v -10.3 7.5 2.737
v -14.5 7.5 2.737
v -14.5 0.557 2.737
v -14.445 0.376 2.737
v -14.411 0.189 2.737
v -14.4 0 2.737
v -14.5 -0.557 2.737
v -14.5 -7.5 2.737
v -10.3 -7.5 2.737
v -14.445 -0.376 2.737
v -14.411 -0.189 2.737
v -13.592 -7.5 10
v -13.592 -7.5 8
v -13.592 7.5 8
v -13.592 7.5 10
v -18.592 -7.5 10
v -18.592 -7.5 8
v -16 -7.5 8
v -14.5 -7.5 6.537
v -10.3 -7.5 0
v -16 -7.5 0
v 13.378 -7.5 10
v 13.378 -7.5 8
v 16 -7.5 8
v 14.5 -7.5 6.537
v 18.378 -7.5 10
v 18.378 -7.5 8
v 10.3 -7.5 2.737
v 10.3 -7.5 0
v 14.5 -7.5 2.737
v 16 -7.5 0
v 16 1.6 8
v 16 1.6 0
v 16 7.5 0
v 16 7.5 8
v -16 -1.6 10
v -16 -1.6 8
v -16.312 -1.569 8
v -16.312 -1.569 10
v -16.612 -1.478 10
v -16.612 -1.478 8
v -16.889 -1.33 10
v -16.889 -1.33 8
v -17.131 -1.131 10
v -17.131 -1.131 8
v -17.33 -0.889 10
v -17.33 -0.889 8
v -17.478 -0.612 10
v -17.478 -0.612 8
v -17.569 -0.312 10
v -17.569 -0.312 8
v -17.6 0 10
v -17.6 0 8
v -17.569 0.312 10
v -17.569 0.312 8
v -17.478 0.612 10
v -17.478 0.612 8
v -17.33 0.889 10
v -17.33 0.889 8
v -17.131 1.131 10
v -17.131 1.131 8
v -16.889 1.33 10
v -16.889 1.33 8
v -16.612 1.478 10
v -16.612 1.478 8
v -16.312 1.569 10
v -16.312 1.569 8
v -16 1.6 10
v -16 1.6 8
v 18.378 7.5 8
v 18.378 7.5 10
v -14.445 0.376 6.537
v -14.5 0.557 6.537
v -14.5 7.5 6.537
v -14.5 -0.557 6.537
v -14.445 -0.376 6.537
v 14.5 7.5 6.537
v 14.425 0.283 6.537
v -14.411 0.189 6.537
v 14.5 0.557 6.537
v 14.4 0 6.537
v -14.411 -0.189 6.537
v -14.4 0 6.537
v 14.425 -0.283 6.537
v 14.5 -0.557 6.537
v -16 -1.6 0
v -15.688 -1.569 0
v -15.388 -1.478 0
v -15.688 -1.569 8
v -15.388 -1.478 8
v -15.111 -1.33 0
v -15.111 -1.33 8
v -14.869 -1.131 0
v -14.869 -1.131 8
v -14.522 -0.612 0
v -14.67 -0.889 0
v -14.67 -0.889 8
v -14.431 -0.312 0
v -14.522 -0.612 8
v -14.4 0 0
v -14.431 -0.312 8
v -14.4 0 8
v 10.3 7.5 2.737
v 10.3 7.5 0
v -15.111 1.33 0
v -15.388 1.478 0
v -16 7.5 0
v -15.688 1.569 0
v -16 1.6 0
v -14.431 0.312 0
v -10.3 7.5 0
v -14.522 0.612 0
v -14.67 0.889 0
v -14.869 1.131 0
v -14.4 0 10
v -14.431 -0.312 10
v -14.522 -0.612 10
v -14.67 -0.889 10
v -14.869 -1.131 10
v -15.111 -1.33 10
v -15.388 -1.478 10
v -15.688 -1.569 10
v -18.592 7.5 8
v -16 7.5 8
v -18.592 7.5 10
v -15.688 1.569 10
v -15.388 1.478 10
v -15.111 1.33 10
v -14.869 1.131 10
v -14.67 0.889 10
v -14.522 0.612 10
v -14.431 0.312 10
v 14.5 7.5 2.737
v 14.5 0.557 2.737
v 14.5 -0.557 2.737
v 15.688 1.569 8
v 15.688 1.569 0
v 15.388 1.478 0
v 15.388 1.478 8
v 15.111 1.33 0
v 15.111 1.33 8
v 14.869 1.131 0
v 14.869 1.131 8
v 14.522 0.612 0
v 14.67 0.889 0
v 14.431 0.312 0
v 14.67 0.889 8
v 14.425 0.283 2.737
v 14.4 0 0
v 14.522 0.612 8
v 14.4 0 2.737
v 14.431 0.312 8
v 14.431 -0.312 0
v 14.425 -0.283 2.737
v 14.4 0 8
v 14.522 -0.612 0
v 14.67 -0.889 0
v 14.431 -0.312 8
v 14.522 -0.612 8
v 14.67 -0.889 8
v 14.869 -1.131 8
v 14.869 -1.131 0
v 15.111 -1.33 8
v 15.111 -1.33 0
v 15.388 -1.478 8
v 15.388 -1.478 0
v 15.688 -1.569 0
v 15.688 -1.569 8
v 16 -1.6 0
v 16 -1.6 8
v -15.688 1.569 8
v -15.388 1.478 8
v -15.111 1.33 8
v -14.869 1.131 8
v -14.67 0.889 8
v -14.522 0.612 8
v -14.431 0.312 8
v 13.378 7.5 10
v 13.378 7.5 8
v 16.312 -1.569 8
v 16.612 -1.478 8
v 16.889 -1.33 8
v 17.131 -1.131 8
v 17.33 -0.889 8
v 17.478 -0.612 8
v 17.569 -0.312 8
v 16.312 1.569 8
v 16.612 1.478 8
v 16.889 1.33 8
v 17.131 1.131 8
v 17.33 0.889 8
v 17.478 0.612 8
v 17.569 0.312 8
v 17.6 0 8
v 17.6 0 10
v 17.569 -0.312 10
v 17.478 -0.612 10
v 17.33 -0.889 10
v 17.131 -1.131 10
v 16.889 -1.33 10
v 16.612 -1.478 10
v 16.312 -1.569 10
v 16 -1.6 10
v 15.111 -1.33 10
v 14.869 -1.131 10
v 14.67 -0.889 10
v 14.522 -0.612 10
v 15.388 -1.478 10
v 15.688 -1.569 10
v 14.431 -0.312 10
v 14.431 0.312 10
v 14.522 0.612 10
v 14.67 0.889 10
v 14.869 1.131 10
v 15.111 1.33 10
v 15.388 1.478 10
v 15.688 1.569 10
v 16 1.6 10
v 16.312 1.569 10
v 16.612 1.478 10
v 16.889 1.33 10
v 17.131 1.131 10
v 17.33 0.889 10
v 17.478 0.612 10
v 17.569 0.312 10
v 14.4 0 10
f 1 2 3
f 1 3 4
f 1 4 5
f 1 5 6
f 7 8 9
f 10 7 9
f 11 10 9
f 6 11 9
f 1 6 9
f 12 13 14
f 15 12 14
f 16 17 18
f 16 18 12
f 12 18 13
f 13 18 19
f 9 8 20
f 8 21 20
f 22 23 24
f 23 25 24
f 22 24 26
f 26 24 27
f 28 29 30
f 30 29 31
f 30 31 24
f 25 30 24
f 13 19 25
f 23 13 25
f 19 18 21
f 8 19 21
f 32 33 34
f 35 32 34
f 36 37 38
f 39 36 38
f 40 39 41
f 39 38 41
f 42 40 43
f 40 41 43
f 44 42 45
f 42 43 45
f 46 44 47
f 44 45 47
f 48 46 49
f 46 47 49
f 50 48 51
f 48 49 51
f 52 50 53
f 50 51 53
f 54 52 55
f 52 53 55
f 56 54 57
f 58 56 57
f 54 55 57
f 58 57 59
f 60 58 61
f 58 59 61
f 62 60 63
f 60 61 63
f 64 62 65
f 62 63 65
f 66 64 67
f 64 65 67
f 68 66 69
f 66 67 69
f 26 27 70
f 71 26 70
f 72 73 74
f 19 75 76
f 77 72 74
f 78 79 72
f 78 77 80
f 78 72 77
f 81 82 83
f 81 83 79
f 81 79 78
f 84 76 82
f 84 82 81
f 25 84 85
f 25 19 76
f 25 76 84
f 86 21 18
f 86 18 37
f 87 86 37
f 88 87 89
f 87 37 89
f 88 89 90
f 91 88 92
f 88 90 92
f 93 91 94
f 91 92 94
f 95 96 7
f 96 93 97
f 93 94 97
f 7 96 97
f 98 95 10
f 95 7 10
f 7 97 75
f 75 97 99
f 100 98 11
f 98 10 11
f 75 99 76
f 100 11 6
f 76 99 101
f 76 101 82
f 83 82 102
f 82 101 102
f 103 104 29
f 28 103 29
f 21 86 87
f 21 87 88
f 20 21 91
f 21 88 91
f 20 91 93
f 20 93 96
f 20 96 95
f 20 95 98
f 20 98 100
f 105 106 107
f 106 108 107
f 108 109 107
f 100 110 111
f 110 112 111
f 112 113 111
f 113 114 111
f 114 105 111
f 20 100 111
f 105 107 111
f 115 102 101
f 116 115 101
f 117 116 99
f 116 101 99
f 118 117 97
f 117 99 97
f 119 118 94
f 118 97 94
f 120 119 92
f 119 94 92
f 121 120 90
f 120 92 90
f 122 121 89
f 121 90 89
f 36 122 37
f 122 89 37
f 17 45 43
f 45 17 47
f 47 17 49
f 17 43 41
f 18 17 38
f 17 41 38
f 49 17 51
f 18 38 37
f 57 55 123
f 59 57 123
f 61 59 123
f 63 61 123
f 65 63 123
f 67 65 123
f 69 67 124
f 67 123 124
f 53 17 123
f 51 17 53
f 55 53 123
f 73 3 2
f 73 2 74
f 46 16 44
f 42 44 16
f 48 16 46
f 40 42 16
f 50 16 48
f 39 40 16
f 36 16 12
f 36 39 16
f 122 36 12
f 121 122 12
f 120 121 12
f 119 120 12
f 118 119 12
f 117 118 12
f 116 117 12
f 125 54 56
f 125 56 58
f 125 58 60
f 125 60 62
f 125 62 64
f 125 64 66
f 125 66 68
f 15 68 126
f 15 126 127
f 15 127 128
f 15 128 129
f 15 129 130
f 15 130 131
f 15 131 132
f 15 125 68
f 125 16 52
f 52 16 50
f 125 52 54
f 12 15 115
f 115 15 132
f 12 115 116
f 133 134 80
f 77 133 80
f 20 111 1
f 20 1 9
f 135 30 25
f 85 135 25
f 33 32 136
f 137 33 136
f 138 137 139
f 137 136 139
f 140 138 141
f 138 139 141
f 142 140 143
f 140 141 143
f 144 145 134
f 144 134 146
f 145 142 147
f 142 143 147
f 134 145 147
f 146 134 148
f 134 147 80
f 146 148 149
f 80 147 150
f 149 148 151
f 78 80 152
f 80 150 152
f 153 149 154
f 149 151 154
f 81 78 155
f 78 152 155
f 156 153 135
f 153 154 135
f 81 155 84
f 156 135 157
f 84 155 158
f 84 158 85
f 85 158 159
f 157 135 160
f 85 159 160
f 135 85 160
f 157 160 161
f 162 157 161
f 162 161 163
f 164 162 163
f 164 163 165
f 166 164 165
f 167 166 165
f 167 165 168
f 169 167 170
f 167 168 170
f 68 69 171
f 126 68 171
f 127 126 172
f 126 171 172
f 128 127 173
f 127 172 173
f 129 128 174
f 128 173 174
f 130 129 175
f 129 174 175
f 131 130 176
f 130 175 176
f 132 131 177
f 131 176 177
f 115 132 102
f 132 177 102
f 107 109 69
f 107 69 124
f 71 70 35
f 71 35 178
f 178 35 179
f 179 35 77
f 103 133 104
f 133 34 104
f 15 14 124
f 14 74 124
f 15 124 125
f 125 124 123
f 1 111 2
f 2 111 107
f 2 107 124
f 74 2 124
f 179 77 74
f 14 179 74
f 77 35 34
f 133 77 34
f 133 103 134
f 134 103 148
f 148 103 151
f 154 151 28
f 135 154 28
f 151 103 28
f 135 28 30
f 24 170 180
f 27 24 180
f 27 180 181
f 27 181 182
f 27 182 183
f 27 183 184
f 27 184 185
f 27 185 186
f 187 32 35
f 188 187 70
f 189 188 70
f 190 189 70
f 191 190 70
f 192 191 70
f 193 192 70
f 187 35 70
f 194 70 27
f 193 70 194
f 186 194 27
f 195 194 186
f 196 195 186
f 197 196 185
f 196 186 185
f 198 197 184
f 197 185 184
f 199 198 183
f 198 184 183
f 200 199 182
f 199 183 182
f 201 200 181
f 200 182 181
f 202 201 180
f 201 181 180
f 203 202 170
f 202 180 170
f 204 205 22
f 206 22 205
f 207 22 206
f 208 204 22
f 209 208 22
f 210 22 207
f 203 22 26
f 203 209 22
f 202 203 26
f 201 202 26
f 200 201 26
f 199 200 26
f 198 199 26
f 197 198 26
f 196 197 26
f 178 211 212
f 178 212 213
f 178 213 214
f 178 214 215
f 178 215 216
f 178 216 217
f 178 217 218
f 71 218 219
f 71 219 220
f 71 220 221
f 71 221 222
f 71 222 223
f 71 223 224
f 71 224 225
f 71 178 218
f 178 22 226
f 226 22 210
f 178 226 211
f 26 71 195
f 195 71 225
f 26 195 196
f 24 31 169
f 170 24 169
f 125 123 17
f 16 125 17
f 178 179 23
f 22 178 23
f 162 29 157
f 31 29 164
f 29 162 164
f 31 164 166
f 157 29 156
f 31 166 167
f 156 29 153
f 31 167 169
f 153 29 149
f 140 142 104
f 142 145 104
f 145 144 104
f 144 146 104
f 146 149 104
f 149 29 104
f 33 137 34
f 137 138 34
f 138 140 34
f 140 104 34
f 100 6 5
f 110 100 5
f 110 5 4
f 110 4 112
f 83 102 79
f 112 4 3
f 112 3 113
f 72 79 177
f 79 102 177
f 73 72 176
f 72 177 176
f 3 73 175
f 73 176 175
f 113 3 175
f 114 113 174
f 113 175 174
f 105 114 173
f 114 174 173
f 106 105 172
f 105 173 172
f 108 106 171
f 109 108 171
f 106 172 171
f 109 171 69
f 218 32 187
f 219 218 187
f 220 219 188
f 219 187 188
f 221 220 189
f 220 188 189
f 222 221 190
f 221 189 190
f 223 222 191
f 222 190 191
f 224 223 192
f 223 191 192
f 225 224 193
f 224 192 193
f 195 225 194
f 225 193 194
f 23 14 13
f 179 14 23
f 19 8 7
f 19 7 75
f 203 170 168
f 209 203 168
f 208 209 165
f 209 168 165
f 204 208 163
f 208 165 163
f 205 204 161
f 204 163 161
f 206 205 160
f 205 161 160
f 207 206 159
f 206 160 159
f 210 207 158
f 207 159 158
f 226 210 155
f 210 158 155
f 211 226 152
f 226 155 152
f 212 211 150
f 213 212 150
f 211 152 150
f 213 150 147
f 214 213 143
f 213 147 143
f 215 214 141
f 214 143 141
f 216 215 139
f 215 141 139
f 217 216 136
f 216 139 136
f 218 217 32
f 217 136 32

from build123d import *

# Parameters (mm, degrees)
F0_W     = 32
F0_H     = 15
F1_DEPTH = 8
F2_W     = 29
F2_H     = 3.8
F3_DEPTH = 30
F5_DEPTH = 2
F6_W     = 20.6003077328
F6_H     = 15
F7_DEPTH = 5
F8_DEPTH = 25


with BuildPart() as f1:
    # F0 (on Top) → F1 (new body)
    with BuildSketch(Plane.XY):
        Rectangle(F0_W, F0_H)
    extrude(amount=F1_DEPTH)

    # F2 (on face) → F3 (cut)
    with BuildSketch(Plane.XZ.offset(7.5)):
        with Locations((0, 4.6374863014)):
            Rectangle(F2_W, F2_H)
    extrude(amount=-F3_DEPTH, mode=Mode.SUBTRACT)

    # F4 (on face) → F5 (join)
    with BuildSketch(Plane.XY.offset(8)):
        with BuildLine():
            Line((18.3776282892, 7.5), (16, 7.5))
            Line((16, 7.5), (16, 1.6))
            ThreePointArc((16, 1.6), (17.1313708499, 1.1313708499), (17.6, 0))
            ThreePointArc((17.6, 0), (17.1313708499, -1.1313708499), (16, -1.6))
            Line((16, -1.6), (16, -7.5))
            Line((16, -7.5), (18.3776282892, -7.5))
            Line((18.3776282892, -7.5), (18.3776282892, 7.5))
        make_face()
        with BuildLine():
            Line((16, 7.5), (13.3776282892, 7.5))
            Line((13.3776282892, 7.5), (13.3776282892, -7.5))
            Line((13.3776282892, -7.5), (16, -7.5))
            Line((16, -7.5), (16, -1.6))
            ThreePointArc((16, -1.6), (14.4, 0), (16, 1.6))
            Line((16, 1.6), (16, 7.5))
        make_face()
        with BuildLine():
            Line((-16, 1.6), (-16, 7.5))
            Line((-16, 7.5), (-18.5922654346, 7.5))
            Line((-18.5922654346, 7.5), (-18.5922654346, -7.5))
            Line((-18.5922654346, -7.5), (-16, -7.5))
            Line((-16, -7.5), (-16, -1.6))
            ThreePointArc((-16, -1.6), (-17.6, 0), (-16, 1.6))
        make_face()
        with BuildLine():
            Line((-13.5922654346, -7.5), (-13.5922654346, 7.5))
            Line((-13.5922654346, 7.5), (-16, 7.5))
            Line((-16, 7.5), (-16, 1.6))
            ThreePointArc((-16, 1.6), (-14.8686291501, 1.1313708499), (-14.4, 0))
            ThreePointArc((-14.4, 0), (-14.8686291501, -1.1313708499), (-16, -1.6))
            Line((-16, -1.6), (-16, -7.5))
            Line((-16, -7.5), (-13.5922654346, -7.5))
        make_face()
    extrude(amount=F5_DEPTH)

    # F6 (on face) → F7 (cut)
    with BuildSketch(Plane(origin=(0, 0, 0), x_dir=(1, 0, 0), z_dir=(0, 0, -1))):
        Rectangle(F6_W, F6_H)
    extrude(amount=-F7_DEPTH, mode=Mode.SUBTRACT)

    # F4 (on face) → F8 (cut)
    with BuildSketch(Plane.XY.offset(8)):
        with BuildLine():
            ThreePointArc((-14.4, 0), (-14.8686291501, 1.1313708499), (-16, 1.6))
            Line((-16, 1.6), (-16, -1.6))
            ThreePointArc((-16, -1.6), (-14.8686291501, -1.1313708499), (-14.4, 0))
        make_face()
        with BuildLine():
            Line((-16, -1.6), (-16, 1.6))
            ThreePointArc((-16, 1.6), (-17.6, 0), (-16, -1.6))
        make_face()
        with BuildLine():
            Line((16, -1.6), (16, 1.6))
            ThreePointArc((16, 1.6), (14.4, 0), (16, -1.6))
        make_face()
        with BuildLine():
            ThreePointArc((17.6, 0), (17.1313708499, 1.1313708499), (16, 1.6))
            Line((16, 1.6), (16, -1.6))
            ThreePointArc((16, -1.6), (17.1313708499, -1.1313708499), (17.6, 0))
        make_face()
    extrude(amount=-F8_DEPTH, mode=Mode.SUBTRACT)


solid = f1.part
